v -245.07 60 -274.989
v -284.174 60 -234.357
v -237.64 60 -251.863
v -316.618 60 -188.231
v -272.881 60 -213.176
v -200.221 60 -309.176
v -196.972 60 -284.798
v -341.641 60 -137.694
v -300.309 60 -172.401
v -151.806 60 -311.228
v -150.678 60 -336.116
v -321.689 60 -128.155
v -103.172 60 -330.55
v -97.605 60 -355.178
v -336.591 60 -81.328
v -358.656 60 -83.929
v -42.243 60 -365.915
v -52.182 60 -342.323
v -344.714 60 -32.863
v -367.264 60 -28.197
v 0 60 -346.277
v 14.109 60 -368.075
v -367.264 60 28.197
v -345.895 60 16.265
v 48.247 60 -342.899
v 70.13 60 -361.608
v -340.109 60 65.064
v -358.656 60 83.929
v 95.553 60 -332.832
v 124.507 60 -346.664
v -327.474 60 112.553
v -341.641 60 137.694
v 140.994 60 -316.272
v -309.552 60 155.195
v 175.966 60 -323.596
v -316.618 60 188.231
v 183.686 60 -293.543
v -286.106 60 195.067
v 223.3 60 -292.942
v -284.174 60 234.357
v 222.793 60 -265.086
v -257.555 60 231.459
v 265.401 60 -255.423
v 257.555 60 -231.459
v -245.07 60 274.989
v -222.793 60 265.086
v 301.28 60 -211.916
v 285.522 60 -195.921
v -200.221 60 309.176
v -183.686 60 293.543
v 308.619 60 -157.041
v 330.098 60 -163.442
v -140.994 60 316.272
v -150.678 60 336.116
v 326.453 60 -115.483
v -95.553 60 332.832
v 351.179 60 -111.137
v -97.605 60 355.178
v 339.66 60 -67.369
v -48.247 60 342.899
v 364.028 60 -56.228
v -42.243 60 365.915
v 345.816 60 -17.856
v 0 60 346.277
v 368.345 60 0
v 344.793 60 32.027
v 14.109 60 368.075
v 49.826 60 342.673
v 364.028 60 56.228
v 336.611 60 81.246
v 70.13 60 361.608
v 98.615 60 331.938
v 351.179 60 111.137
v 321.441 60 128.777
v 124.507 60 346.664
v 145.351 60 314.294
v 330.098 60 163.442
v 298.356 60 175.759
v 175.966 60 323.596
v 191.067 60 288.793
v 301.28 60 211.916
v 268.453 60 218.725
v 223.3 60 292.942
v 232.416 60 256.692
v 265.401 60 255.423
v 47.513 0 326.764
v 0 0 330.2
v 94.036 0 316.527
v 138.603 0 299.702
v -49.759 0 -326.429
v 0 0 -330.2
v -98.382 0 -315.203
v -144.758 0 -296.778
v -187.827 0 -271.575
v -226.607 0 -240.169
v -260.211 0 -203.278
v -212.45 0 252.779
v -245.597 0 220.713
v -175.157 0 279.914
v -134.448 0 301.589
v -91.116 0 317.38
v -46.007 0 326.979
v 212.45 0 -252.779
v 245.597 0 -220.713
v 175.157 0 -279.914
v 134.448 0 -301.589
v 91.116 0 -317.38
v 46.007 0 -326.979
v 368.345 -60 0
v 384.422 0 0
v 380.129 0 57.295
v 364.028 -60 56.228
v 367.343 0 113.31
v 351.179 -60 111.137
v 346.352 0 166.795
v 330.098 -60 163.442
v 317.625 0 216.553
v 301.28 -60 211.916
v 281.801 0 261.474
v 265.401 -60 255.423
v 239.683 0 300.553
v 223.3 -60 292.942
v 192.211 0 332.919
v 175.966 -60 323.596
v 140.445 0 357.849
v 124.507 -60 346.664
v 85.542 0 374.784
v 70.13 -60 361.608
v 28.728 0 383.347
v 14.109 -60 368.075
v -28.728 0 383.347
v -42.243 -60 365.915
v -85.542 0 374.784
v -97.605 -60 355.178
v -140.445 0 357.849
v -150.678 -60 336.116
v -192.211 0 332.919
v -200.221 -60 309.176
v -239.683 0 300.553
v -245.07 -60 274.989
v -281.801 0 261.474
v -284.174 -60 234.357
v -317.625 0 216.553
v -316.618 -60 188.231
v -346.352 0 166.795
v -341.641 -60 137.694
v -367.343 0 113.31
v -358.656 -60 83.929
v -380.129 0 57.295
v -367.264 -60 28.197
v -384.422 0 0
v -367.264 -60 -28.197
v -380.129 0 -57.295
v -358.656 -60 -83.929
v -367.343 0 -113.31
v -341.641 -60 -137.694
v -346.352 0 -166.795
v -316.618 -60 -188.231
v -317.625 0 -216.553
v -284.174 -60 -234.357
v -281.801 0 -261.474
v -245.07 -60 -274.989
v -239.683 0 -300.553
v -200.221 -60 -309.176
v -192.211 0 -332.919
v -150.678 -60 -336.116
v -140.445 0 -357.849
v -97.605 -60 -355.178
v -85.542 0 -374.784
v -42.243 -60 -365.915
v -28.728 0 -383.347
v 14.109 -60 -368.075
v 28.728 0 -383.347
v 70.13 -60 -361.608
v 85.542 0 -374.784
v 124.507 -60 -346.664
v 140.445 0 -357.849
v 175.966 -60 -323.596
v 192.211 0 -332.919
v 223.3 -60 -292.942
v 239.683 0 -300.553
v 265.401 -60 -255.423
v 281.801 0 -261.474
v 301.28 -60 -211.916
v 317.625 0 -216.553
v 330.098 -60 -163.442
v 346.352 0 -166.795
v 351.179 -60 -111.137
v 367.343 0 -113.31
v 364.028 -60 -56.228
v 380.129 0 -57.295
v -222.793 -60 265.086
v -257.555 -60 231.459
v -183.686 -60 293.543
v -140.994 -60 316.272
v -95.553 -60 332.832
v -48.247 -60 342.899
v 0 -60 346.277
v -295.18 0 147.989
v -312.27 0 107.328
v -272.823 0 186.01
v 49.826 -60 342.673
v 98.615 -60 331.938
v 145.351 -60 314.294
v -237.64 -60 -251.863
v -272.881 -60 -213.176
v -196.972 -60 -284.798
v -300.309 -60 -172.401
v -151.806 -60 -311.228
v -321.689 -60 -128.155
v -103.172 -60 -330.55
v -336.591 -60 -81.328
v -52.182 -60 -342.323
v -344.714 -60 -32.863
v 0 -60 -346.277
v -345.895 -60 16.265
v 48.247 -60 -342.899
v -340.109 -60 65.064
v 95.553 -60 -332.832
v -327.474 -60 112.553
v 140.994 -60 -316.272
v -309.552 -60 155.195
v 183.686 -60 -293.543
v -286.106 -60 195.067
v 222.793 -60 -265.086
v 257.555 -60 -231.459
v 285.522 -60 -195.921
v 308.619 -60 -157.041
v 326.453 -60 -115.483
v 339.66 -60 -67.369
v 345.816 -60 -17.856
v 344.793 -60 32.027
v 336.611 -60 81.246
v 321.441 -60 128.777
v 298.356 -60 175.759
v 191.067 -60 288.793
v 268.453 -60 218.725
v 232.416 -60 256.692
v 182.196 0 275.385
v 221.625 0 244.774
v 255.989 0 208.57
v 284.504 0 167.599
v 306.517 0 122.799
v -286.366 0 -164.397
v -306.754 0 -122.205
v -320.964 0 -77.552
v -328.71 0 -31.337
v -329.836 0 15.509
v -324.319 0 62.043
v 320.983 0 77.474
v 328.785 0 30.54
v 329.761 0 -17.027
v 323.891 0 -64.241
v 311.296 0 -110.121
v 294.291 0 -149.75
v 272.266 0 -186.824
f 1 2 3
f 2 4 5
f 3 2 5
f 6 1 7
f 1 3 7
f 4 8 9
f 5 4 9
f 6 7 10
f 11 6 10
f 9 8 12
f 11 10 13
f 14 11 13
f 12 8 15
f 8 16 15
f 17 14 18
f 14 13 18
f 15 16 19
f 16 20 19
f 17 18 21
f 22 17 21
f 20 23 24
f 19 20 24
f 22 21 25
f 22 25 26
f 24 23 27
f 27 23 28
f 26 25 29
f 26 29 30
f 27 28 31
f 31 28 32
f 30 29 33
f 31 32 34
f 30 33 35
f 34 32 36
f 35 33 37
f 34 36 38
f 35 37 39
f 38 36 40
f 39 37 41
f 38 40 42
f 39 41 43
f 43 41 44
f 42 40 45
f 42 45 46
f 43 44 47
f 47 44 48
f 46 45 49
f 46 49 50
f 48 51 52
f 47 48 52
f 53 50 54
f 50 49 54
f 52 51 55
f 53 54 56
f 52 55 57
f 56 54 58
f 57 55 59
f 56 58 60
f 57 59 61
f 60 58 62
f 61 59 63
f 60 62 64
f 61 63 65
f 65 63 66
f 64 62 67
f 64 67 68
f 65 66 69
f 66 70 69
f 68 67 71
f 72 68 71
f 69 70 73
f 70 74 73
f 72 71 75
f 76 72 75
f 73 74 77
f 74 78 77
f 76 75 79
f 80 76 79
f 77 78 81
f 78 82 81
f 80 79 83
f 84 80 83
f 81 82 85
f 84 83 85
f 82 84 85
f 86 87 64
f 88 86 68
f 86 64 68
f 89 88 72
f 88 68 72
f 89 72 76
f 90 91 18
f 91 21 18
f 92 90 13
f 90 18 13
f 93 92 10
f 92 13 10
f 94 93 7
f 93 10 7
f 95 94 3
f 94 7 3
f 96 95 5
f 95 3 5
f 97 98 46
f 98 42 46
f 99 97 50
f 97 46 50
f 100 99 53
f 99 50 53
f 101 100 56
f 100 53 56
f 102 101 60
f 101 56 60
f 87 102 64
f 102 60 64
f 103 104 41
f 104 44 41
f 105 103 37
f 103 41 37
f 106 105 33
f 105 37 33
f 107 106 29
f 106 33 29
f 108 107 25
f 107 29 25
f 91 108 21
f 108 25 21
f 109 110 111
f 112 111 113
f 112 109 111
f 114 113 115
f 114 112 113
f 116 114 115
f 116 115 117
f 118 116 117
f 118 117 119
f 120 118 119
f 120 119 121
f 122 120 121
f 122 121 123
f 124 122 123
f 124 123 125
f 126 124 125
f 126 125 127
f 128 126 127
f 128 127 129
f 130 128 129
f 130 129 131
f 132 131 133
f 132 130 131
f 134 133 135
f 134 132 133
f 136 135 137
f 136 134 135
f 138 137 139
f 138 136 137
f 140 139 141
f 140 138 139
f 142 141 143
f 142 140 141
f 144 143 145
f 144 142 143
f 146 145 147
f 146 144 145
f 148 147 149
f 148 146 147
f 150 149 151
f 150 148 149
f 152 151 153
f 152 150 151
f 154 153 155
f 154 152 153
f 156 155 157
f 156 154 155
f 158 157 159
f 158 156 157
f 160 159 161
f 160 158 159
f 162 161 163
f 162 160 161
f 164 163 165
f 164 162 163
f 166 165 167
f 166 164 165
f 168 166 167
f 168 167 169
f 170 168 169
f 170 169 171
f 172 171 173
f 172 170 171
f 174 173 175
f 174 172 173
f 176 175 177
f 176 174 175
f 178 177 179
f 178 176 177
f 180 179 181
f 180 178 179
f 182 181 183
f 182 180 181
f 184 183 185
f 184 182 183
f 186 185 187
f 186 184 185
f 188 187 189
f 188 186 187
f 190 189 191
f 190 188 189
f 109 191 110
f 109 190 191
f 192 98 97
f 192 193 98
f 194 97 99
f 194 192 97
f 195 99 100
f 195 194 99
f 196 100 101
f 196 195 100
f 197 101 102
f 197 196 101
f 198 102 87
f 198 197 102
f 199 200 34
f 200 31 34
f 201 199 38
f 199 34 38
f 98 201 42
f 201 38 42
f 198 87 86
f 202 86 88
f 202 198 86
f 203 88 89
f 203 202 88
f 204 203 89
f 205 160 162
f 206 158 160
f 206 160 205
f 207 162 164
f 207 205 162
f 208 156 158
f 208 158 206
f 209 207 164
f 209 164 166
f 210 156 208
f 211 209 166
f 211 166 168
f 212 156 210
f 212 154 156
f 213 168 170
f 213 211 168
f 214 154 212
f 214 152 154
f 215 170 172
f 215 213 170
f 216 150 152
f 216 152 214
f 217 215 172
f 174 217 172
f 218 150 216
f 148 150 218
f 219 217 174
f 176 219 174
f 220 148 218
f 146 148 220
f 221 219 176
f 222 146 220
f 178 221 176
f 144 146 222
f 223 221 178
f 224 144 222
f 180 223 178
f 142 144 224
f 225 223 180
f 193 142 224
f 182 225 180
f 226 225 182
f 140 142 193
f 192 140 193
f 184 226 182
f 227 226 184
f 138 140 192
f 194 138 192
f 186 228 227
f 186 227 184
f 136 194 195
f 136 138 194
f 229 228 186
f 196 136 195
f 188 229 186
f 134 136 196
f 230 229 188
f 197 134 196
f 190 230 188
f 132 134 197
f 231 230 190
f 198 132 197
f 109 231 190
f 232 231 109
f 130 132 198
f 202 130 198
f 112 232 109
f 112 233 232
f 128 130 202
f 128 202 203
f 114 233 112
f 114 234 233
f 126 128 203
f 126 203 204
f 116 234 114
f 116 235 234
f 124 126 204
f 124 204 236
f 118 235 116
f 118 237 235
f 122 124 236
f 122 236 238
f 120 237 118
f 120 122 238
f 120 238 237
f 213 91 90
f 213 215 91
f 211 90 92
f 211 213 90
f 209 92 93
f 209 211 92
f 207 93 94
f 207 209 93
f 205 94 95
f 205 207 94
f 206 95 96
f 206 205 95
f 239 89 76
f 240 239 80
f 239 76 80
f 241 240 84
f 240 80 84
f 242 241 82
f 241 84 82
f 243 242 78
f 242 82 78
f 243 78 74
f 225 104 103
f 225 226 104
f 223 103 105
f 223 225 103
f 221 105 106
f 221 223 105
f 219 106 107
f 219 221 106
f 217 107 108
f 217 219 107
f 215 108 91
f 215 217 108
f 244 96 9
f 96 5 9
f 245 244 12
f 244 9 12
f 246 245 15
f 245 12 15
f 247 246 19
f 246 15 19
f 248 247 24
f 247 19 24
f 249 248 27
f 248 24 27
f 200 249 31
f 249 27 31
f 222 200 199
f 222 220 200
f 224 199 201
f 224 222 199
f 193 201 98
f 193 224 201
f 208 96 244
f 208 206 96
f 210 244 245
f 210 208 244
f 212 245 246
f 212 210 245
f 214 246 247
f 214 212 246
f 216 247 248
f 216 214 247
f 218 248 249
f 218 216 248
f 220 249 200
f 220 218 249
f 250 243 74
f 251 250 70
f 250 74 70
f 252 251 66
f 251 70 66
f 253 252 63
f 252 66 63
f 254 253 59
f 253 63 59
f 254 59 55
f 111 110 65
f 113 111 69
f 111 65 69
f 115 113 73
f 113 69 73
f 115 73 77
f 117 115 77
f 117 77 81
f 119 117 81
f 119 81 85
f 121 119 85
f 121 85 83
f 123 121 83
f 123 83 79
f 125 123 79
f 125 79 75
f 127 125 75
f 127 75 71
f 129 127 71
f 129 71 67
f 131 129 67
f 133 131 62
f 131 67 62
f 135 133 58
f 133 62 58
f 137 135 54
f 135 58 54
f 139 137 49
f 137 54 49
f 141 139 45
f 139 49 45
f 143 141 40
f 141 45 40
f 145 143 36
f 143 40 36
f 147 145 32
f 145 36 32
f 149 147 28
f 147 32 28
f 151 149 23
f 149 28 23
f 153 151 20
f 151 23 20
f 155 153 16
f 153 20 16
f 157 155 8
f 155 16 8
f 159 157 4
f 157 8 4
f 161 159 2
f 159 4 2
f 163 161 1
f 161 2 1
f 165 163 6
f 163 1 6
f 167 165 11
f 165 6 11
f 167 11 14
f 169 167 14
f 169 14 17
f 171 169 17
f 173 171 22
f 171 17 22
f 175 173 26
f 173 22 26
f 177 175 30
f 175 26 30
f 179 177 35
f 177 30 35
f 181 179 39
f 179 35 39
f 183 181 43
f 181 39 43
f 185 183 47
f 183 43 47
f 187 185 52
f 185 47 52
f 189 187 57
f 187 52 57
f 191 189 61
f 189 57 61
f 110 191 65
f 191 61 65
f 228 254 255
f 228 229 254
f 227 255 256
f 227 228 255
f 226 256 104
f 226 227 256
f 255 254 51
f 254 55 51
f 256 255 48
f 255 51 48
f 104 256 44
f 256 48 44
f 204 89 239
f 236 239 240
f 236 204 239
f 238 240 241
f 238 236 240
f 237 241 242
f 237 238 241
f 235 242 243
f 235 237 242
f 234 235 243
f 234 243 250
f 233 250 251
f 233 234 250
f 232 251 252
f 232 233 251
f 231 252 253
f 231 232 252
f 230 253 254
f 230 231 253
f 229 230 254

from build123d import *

# Parameters (mm, degrees)
F0_R     = 384.4222137889
F1_DEPTH = 60
F1_TAPER = 15


with BuildPart() as f1:
    # F0 (on Front) → F1 (new body, symmetric)
    with BuildSketch(Plane.XZ):
        Circle(F0_R)
        with BuildLine():
            ThreePointArc((-306.5168000492, -122.798580153), (-324.2251435162, -62.5307629242), (-330.2, 0))
            ThreePointArc((-330.2, 0), (-325.6867721675, 54.4074115828), (-312.2704637484, 107.3275242906))
            ThreePointArc((-312.2704637484, 107.3275242906), (-284.6368182454, 167.37359917), (-245.597160306, 220.7126522191))
            ThreePointArc((-245.597160306, 220.7126522191), (-189.128113572, 270.670642399), (-122.798580153, 306.5168000492))
            ThreePointArc((-122.798580153, 306.5168000492), (-62.5307629242, 324.2251435162), (0, 330.2))
            ThreePointArc((0, 330.2), (70.9592964928, 322.4853767867), (138.6028798667, 299.701988136))
            ThreePointArc((138.6028798667, 299.701988136), (205.1525193234, 258.7363210205), (260.2112729594, 203.2784627668))
            ThreePointArc((260.2112729594, 203.2784627668), (286.2069706705, 164.6742540278), (306.5168000492, 122.798580153))
            ThreePointArc((306.5168000492, 122.798580153), (324.2251435162, 62.5307629242), (330.2, 0))
            ThreePointArc((330.2, 0), (325.4397731908, -55.8658574223), (311.2963414565, -110.1209689195))
            ThreePointArc((311.2963414565, -110.1209689195), (283.8841721197, -168.6470184139), (245.597160306, -220.7126522191))
            ThreePointArc((245.597160306, -220.7126522191), (189.128113572, -270.670642399), (122.798580153, -306.5168000492))
            ThreePointArc((122.798580153, -306.5168000492), (62.5307629242, -324.2251435162), (0, -330.2))
            ThreePointArc((0, -330.2), (-78.1374463344, -320.8217253871), (-151.8364043025, -293.2196213225))
            ThreePointArc((-151.8364043025, -293.2196213225), (-210.8747853225, -254.0942048044), (-260.2112729594, -203.2784627668))
            ThreePointArc((-260.2112729594, -203.2784627668), (-286.2069706705, -164.6742540278), (-306.5168000492, -122.798580153))
        make_face(mode=Mode.SUBTRACT)
    extrude(amount=F1_DEPTH, both=True, taper=F1_TAPER)


solid = f1.part
